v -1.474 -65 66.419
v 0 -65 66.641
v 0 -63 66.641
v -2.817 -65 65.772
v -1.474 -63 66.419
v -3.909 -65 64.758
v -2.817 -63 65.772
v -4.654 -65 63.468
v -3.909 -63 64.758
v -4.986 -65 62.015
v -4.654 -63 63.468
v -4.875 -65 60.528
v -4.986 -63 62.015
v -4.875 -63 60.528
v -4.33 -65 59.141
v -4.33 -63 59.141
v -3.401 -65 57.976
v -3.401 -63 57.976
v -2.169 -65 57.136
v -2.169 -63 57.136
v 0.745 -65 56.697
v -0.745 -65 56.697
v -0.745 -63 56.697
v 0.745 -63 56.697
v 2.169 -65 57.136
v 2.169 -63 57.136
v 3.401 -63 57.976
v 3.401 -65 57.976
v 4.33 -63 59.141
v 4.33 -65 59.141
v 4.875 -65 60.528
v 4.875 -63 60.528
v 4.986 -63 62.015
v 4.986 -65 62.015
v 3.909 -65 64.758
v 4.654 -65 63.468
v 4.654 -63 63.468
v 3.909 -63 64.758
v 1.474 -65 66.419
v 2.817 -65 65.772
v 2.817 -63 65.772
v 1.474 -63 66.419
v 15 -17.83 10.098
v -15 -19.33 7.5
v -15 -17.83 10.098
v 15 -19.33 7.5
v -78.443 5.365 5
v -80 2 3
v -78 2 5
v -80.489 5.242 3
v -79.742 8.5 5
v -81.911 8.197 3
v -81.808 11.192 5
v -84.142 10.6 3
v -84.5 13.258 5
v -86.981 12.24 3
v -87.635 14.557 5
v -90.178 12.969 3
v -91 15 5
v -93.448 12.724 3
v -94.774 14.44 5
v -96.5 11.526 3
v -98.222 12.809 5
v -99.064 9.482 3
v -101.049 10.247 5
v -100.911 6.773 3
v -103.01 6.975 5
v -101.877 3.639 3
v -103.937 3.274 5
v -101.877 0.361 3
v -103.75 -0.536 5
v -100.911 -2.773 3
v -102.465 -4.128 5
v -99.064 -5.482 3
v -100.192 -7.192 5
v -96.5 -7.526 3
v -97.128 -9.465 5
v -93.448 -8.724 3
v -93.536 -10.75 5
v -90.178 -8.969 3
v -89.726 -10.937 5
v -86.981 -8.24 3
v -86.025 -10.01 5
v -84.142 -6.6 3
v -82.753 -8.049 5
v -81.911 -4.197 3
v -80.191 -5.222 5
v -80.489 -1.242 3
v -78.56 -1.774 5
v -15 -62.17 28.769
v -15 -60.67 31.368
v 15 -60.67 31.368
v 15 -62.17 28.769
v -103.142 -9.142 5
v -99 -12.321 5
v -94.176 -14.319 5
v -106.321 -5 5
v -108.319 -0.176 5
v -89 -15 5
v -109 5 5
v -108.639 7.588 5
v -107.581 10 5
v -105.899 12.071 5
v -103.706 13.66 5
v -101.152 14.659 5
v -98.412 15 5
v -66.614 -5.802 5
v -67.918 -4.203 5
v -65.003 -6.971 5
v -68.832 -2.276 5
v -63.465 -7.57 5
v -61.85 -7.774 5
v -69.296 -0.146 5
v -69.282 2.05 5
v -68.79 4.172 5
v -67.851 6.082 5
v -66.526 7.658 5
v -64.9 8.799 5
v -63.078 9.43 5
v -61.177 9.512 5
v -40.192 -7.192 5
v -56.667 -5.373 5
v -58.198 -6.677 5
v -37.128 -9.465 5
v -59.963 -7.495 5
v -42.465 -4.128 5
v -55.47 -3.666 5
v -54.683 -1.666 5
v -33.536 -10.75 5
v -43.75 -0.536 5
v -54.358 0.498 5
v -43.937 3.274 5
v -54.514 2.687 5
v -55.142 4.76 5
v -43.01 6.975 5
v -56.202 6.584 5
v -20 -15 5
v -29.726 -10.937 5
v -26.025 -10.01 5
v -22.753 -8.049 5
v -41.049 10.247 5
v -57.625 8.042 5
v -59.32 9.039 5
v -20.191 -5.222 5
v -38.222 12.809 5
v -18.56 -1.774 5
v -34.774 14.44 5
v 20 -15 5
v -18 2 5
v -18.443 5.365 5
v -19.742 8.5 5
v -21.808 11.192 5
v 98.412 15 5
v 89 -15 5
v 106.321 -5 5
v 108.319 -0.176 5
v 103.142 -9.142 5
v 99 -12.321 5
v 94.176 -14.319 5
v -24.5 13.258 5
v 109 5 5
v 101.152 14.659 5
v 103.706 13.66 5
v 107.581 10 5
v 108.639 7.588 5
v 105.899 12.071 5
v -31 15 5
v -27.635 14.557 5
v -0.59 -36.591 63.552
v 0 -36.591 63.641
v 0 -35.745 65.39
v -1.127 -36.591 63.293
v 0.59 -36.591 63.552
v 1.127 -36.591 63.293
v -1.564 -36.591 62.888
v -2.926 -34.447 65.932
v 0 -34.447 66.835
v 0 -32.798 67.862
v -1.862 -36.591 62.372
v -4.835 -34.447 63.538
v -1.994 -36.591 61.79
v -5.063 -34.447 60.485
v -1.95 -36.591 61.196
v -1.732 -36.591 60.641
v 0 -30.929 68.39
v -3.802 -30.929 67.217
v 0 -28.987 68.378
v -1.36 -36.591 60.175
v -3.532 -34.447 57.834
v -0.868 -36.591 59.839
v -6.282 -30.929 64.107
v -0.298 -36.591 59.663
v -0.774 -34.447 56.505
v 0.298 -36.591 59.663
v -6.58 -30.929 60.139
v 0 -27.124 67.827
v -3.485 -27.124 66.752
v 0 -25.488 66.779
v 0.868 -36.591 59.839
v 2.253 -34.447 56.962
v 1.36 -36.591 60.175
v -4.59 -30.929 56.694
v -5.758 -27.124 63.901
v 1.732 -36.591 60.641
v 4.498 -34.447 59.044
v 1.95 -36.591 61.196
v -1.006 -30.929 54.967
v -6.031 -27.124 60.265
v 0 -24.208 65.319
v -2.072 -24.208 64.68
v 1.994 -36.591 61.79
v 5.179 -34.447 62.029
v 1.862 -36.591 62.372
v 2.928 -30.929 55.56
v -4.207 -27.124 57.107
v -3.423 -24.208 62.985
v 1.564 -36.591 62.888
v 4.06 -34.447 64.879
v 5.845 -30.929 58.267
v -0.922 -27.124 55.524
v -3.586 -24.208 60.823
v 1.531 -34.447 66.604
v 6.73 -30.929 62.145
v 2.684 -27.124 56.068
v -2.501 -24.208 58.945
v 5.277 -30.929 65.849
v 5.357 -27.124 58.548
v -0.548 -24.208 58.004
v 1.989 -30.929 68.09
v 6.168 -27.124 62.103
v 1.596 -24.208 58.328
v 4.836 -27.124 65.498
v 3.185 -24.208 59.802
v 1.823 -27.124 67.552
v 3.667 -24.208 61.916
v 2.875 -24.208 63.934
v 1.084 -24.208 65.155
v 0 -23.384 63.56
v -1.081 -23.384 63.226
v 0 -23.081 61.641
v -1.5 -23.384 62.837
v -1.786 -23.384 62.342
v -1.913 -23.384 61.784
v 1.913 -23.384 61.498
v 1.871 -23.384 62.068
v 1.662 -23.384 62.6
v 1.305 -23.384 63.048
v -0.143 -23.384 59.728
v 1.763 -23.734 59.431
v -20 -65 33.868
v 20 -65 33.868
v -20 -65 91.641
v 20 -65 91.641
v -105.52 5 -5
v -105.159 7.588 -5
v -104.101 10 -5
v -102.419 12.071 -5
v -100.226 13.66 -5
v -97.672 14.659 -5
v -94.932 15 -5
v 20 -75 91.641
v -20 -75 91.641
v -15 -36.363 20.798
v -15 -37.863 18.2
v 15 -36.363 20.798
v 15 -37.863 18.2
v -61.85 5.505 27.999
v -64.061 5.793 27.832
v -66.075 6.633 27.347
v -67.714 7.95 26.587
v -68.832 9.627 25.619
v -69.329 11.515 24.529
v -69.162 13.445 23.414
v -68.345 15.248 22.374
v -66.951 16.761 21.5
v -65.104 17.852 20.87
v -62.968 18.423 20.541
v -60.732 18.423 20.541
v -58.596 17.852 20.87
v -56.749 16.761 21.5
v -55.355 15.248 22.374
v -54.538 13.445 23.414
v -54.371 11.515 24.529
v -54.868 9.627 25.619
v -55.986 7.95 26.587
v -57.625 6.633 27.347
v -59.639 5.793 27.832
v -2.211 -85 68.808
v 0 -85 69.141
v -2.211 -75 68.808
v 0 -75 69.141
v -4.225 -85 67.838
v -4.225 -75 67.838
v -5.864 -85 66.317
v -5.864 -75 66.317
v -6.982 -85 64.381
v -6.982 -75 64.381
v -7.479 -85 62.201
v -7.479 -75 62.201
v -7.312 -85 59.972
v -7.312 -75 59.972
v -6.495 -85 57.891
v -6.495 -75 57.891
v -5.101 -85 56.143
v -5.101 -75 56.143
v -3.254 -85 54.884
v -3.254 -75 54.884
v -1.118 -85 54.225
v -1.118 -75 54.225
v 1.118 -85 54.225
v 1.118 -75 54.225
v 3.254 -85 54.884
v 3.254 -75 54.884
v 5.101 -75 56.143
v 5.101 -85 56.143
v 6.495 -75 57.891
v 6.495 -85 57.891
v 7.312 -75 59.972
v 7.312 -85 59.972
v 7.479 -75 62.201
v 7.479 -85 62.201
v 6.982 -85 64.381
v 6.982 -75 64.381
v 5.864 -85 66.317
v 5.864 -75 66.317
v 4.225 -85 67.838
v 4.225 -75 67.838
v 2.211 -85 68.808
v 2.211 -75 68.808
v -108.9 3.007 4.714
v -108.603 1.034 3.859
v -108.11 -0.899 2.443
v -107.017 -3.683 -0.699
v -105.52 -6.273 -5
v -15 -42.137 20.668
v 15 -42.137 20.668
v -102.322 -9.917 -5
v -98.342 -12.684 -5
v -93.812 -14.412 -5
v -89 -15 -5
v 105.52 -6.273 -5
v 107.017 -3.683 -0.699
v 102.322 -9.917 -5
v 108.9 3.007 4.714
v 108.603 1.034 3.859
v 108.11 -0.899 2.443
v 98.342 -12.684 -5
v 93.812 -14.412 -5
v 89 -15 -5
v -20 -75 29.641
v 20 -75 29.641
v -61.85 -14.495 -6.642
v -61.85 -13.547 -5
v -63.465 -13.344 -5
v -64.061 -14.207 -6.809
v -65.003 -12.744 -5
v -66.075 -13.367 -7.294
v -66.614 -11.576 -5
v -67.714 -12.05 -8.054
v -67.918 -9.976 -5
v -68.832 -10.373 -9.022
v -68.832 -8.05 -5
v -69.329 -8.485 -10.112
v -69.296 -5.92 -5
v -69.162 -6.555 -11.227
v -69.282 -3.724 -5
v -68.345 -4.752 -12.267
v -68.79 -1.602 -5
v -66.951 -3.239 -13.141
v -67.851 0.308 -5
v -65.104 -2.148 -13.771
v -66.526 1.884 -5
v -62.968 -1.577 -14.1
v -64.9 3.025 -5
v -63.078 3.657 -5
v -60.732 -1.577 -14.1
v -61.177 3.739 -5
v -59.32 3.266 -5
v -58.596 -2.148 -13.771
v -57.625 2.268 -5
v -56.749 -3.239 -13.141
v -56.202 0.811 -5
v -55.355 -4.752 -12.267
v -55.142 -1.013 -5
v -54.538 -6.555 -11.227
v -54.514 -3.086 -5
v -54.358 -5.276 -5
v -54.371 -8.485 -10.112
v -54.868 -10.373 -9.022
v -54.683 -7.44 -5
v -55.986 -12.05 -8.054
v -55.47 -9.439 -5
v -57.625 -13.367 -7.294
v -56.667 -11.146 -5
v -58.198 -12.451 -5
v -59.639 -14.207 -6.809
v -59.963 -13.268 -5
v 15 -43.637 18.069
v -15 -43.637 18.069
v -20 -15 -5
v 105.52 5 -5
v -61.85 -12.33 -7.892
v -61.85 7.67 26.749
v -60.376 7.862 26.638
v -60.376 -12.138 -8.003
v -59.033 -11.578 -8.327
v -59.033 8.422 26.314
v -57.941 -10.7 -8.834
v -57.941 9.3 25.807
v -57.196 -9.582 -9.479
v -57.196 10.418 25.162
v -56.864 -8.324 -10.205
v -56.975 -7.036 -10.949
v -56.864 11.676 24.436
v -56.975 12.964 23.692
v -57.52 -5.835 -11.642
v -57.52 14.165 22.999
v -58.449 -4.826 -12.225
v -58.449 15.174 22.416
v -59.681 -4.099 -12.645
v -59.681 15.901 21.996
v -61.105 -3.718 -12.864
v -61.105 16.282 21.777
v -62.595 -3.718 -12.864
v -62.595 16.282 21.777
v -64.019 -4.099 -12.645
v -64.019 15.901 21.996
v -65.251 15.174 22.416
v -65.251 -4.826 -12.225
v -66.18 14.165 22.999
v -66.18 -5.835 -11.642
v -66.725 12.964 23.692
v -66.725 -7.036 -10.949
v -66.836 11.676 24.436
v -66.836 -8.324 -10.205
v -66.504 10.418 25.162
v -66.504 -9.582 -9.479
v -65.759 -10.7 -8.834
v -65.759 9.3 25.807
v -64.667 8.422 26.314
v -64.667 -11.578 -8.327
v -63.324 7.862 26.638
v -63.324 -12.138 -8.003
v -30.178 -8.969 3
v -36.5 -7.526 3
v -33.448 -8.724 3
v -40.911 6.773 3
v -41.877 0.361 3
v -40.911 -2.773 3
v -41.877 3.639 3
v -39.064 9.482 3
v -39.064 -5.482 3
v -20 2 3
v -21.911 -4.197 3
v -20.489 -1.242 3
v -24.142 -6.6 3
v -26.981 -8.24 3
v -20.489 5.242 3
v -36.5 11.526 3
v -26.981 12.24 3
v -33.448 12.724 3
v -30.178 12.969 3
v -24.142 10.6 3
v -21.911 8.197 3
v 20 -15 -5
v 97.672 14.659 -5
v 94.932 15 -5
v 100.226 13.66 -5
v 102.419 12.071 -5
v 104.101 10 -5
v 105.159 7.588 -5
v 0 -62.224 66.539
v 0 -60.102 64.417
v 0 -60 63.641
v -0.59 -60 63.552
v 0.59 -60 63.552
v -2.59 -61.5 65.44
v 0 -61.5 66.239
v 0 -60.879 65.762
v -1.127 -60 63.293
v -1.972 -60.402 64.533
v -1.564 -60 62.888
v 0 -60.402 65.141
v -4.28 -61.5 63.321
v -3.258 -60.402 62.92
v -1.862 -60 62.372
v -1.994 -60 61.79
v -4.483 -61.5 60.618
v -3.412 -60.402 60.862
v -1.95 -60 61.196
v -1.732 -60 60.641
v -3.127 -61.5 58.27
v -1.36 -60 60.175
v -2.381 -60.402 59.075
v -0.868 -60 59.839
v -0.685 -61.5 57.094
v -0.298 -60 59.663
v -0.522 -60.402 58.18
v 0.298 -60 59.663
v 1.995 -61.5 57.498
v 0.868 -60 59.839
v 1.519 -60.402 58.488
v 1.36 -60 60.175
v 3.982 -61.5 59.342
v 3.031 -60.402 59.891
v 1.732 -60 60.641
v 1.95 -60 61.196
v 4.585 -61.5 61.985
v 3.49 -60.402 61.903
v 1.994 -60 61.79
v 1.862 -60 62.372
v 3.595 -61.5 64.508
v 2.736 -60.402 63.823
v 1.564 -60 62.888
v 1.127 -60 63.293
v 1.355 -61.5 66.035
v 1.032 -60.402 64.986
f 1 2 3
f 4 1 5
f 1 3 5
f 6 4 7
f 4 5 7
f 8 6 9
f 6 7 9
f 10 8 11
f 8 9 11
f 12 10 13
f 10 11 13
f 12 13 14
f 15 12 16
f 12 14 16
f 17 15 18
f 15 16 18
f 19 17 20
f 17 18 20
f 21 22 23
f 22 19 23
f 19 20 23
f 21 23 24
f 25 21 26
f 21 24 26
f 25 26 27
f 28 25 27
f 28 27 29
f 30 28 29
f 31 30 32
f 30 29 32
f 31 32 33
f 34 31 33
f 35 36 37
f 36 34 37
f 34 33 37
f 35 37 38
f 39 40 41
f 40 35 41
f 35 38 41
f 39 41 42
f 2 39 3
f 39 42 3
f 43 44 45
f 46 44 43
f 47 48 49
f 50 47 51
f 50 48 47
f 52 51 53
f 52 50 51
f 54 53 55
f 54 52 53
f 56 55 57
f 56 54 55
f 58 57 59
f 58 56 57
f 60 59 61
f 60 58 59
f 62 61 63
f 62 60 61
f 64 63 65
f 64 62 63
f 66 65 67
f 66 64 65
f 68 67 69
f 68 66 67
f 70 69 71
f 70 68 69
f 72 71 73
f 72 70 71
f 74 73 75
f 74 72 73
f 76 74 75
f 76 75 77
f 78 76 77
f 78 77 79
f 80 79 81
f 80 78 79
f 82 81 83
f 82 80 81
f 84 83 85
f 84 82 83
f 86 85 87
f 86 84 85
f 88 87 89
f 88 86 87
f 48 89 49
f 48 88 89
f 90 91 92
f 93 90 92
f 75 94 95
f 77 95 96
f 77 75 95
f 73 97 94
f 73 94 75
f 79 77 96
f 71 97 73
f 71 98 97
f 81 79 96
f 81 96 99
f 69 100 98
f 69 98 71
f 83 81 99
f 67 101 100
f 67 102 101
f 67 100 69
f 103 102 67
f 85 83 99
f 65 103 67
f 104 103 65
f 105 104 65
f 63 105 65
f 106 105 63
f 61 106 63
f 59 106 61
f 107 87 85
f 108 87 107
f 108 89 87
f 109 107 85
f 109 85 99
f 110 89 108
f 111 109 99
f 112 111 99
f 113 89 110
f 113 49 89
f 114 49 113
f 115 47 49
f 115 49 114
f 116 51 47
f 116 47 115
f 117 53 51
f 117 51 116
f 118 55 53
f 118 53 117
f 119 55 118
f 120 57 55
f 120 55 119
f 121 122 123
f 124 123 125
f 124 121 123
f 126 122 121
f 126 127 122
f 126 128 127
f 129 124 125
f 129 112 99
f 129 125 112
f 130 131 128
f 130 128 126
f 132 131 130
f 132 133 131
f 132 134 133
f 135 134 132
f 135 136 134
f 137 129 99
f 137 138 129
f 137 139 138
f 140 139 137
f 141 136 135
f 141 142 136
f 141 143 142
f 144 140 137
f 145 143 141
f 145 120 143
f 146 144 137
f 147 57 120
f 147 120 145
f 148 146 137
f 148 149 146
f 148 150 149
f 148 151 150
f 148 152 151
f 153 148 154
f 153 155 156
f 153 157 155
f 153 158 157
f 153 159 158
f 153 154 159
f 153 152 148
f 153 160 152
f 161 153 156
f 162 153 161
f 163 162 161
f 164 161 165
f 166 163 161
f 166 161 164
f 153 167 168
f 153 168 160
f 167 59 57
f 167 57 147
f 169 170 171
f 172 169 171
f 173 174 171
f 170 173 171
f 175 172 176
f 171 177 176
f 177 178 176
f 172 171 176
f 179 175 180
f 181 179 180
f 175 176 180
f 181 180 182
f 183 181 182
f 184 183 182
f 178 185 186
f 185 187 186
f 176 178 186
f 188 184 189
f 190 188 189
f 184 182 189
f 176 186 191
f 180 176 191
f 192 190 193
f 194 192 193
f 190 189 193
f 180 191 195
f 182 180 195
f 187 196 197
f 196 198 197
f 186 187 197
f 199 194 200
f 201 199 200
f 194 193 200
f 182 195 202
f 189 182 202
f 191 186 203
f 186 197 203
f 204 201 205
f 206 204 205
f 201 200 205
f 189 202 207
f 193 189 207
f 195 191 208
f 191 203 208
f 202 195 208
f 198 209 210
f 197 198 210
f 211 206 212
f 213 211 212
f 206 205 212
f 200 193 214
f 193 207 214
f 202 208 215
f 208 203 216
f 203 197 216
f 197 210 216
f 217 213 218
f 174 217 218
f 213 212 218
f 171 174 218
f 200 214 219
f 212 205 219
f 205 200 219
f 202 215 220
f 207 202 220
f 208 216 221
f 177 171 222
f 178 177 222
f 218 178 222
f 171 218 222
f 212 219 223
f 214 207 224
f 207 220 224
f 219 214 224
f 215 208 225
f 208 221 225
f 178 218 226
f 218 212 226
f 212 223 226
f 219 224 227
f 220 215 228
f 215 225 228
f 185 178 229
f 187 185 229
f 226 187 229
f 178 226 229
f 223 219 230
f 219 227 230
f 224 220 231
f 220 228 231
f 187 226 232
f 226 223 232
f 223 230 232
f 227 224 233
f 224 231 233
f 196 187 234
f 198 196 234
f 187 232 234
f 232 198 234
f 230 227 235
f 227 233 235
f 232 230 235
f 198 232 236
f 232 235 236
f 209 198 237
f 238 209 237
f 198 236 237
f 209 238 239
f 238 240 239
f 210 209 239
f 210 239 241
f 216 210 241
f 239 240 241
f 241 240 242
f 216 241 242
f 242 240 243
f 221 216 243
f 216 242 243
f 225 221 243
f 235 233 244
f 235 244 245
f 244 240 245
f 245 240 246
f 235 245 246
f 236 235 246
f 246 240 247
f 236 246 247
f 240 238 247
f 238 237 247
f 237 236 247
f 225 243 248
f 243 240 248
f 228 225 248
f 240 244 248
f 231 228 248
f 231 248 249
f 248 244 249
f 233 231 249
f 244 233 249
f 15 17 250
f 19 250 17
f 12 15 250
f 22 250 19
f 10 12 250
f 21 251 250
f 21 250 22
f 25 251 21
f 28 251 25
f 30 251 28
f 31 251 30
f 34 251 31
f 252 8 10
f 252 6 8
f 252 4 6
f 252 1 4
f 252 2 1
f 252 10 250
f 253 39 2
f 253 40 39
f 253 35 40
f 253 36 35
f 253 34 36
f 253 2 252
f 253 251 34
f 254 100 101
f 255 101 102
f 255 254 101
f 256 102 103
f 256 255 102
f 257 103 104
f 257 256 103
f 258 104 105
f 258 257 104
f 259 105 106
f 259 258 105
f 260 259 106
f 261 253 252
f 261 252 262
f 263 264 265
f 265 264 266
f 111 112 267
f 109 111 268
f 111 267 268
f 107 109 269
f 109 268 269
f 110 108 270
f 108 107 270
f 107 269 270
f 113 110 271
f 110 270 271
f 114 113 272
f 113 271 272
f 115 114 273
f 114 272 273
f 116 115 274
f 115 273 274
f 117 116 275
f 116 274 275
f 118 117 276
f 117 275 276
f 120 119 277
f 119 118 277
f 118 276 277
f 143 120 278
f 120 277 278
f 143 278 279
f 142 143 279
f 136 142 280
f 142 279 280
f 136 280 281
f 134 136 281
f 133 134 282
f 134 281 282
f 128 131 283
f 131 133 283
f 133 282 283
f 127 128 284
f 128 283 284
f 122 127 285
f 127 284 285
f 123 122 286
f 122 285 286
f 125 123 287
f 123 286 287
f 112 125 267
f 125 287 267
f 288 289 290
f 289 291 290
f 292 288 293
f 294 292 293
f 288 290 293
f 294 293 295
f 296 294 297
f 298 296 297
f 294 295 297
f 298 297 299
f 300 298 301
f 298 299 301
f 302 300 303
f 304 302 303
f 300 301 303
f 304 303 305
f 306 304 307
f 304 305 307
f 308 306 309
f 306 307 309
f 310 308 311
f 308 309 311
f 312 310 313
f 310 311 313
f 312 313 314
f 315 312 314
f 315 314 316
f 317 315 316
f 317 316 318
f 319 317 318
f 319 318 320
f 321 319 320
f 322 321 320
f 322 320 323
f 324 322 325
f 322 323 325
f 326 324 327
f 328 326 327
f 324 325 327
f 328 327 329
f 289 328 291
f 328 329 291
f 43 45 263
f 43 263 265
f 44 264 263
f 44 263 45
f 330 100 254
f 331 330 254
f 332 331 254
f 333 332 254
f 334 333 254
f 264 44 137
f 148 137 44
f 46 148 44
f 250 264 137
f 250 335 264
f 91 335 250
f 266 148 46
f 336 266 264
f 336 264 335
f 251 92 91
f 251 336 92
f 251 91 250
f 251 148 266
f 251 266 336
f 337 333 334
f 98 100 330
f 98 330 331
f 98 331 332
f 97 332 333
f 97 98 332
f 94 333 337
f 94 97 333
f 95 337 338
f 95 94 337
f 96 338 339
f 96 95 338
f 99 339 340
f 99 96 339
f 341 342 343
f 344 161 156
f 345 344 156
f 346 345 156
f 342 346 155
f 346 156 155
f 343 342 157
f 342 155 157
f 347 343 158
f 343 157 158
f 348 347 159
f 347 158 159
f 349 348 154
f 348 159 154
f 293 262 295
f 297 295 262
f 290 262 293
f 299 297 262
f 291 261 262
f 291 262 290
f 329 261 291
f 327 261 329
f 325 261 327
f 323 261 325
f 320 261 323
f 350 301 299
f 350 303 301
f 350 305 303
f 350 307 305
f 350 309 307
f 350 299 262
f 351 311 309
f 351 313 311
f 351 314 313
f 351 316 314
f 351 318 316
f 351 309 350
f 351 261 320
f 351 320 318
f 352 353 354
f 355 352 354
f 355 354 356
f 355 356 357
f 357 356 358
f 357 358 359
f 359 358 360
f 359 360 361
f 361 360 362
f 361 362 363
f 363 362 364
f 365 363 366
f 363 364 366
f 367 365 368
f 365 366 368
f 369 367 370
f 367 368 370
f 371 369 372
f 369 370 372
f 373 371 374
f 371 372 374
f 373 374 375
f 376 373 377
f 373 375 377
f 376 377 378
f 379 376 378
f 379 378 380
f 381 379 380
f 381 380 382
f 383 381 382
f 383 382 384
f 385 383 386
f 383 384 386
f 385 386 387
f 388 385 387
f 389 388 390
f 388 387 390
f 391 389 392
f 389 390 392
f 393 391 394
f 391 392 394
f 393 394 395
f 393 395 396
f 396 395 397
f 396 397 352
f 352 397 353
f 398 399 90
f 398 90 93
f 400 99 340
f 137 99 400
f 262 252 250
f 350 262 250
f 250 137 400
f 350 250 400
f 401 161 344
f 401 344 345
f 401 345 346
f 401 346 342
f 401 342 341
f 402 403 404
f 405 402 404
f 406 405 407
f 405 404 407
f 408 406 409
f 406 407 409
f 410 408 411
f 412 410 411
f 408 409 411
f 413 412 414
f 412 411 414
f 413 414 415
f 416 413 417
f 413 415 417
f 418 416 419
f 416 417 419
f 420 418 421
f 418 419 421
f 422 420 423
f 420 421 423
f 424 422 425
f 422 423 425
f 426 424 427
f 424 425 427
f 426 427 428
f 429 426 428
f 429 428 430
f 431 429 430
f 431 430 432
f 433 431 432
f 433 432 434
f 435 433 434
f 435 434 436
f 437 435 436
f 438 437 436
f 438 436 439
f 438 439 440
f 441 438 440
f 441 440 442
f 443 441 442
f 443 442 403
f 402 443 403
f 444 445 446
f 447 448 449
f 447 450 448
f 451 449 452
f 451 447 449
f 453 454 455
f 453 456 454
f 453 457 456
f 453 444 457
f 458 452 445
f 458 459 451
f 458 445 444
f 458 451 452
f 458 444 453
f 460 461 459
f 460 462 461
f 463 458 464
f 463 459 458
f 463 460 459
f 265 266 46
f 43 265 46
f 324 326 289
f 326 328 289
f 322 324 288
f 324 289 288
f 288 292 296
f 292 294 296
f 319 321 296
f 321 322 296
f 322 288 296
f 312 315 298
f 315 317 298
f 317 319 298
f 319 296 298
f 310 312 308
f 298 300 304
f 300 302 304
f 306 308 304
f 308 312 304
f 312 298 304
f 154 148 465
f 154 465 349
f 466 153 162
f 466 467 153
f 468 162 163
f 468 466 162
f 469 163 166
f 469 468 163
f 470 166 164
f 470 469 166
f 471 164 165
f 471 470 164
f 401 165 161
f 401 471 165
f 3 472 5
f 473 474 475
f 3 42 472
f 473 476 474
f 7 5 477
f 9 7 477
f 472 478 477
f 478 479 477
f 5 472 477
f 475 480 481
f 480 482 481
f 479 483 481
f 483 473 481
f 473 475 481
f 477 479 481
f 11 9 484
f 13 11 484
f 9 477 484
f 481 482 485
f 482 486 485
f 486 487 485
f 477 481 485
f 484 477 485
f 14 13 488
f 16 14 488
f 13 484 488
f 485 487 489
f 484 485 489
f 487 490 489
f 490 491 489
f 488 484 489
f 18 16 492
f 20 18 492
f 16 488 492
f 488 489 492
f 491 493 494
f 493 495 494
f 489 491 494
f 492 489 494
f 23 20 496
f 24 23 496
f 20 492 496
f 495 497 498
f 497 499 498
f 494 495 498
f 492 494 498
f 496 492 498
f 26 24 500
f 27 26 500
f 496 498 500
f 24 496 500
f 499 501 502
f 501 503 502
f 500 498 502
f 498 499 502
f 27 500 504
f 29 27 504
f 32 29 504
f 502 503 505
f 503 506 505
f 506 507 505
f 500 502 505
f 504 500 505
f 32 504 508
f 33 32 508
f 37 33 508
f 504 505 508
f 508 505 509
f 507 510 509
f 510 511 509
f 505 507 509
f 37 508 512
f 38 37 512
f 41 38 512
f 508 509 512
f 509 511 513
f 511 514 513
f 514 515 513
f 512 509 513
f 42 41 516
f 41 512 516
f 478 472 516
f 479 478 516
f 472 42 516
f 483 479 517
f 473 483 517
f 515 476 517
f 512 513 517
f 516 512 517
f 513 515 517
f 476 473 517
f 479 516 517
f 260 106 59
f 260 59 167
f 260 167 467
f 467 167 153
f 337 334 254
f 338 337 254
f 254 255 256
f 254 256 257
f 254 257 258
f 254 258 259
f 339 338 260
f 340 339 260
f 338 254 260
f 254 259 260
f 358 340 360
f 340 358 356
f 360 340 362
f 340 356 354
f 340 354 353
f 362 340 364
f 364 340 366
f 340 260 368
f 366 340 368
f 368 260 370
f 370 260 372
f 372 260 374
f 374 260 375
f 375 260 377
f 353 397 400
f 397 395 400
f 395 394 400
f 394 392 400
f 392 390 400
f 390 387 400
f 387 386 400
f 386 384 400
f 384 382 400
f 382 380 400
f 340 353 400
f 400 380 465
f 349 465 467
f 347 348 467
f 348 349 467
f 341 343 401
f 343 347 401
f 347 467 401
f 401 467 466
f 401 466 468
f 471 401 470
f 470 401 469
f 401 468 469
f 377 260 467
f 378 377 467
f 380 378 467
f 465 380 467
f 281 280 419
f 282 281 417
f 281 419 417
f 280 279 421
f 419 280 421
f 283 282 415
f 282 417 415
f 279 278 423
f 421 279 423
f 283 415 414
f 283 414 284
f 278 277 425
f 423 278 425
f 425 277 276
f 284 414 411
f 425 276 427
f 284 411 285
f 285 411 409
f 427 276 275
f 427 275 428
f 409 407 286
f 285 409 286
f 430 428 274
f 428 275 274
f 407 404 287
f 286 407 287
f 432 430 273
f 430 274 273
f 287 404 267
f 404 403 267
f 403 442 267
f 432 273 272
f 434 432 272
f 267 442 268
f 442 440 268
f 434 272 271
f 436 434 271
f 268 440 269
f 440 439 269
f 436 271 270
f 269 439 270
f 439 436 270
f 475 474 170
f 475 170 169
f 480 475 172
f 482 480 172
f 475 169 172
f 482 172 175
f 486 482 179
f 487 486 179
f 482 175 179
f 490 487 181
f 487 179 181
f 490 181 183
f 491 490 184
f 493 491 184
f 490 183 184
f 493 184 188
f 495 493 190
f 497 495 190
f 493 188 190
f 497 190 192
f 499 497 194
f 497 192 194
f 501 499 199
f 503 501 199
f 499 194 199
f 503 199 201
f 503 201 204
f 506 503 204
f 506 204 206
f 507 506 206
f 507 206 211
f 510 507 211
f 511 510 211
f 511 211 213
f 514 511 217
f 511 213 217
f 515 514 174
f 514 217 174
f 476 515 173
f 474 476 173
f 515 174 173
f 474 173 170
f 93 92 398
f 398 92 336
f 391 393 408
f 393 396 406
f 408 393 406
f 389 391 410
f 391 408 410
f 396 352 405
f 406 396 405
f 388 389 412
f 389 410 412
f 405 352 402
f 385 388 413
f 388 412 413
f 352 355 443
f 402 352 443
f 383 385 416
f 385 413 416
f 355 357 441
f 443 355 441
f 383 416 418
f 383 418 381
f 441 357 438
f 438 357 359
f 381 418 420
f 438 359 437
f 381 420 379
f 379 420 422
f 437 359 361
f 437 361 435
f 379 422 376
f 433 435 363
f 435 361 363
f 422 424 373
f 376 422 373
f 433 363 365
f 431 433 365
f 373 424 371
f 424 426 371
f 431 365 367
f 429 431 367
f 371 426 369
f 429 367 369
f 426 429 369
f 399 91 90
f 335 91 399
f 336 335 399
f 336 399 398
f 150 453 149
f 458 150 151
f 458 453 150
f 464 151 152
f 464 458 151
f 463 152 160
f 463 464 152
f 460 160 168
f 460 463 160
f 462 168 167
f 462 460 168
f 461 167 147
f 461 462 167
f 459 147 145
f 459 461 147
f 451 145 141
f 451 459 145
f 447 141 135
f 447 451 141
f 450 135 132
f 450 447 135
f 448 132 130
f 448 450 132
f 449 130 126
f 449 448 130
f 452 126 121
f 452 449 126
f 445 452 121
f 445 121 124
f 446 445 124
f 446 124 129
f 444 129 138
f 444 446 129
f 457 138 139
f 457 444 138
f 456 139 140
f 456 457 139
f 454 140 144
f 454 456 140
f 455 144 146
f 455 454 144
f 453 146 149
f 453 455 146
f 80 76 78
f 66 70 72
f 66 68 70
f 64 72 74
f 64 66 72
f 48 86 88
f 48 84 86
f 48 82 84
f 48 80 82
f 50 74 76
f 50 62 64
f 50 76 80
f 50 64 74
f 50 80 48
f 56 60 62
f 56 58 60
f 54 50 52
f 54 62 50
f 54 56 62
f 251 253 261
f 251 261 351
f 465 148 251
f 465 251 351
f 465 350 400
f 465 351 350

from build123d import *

# Parameters (mm, degrees)
SKETCH2_W           = 218
SKETCH2_H           = 30
BOSS_EXTRUDE1_DEPTH = 5
FILLET1_R           = 20
SKETCH3_R           = 10
CUT_EXTRUDE1_DEPTH  = 2
CHAMFER1_SIZE       = 3
SKETCH6_R           = 5
CUT_EXTRUDE2_DEPTH  = 119.749210232
BOSS_EXTRUDE2_DEPTH = 20
SKETCH8_W           = 30
SKETCH8_H           = 21.4
BOSS_EXTRUDE4_DEPTH = 3
SKETCH9_W           = 30
SKETCH9_H           = 21.4
CUT_EXTRUDE3_DEPTH  = 3
CUT_EXTRUDE4_DEPTH  = 40
FILLET2_R           = 10
CUT_EXTRUDE5_DEPTH  = 40
FILLET3_R           = 10


with BuildPart() as part:
    # Sketch2 → Boss-Extrude1 (new, symmetric)
    with BuildSketch(Plane.XY):
        Rectangle(SKETCH2_W, SKETCH2_H)
    extrude(amount=BOSS_EXTRUDE1_DEPTH, both=True)

    # Fillet1
    fillet1_edges = [part.edges().sort_by_distance(p)[0] for p in [
        (109, -15, 0),
        (-109, -15, 0),
    ]]
    fillet(fillet1_edges, radius=FILLET1_R)

    # Sketch3 → Cut-Extrude1 (cut, symmetric)
    with BuildSketch(Plane.XY.offset(5)):
        with Locations((-91, 2)):
            Circle(SKETCH3_R)
        with Locations((-31, 2)):
            Circle(SKETCH3_R)
    extrude(amount=CUT_EXTRUDE1_DEPTH, both=True, mode=Mode.SUBTRACT)

    # Chamfer1
    # the kernel refuses this chamfer: 3 mm, written as the material it takes off along each edge
    with BuildSketch(Plane(origin=(-31, 2, 5), x_dir=(1, 0, 0), z_dir=(0, -1, 0))) as chamfer1_piece_1_section:
        Polygon((10 + CHAMFER1_SIZE, 0), (10, -CHAMFER1_SIZE), (10, 0), align=None)
    chamfer1_piece_1 = revolve(axis=Axis((-31, 2, 5), (0, 0, 1)), mode=Mode.PRIVATE)
    chamfer1_piece_1 = split(chamfer1_piece_1, bisect_by=Plane(origin=(-42.994962735, 2, 3), z_dir=(0, 0, 1)), keep=Keep.TOP, mode=Mode.PRIVATE)
    add(chamfer1_piece_1, mode=Mode.SUBTRACT)
    with BuildSketch(Plane(origin=(-91, 2, 5), x_dir=(1, 0, 0), z_dir=(0, -1, 0))) as chamfer1_piece_2_section:
        Polygon((10 + CHAMFER1_SIZE, 0), (10, -CHAMFER1_SIZE), (10, 0), align=None)
    chamfer1_piece_2 = revolve(axis=Axis((-91, 2, 5), (0, 0, 1)), mode=Mode.PRIVATE)
    chamfer1_piece_2 = split(chamfer1_piece_2, bisect_by=Plane(origin=(-102.994962728, 2, 3), z_dir=(0, 0, 1)), keep=Keep.TOP, mode=Mode.PRIVATE)
    add(chamfer1_piece_2, mode=Mode.SUBTRACT)

    # Sketch5 → Revolve1 (revolve)
    with BuildSketch(Plane(origin=(-61.85, 0, 0), x_dir=(0, 0, -1), z_dir=(1, 0, 0)), mode=Mode.PRIVATE) as revolve1_sk:
        Polygon((-20.498711306, 18.495190528), (-24.248711306, 12), (10.392304845, -8), (14.142304845, -1.504809472), align=None)
    revolve(revolve1_sk.sketch.rotate(Axis((-61.85, 12, 24.248711306), (0, -0.4999999999999977, -0.86602540378444)), 180), axis=Axis((-61.85, 12, 24.248711306), (0, -0.4999999999999977, -0.86602540378444)))

    # Sketch6 → Cut-Extrude2 (cut, through all)
    with BuildSketch(Plane(origin=(0, 13.5, 23.382685902), x_dir=(1, 0, 0), z_dir=(0, 0.4999999999999978, 0.86602540378444))):
        with Locations(Location((-61.85, -1.732050808, 0), (0, 0, 270))):
            Circle(SKETCH6_R)
    extrude(amount=-CUT_EXTRUDE2_DEPTH, mode=Mode.SUBTRACT)

    # Sketch7 → Boss-Extrude2 (add, symmetric)
    with BuildSketch(Plane(origin=(0, 0, 0), x_dir=(0, 0, -1), z_dir=(1, 0, 0))):
        Polygon((5, -15), (-5, -15), (-33.867513459, -65), (-91.641016151, -65), (-91.641016151, -75), (-29.641016151, -75), align=None)
    extrude(amount=BOSS_EXTRUDE2_DEPTH, both=True)

    # Sketch8 → Boss-Extrude4 (add)
    with BuildSketch(Plane(origin=(0, -1.584936491, -2.745190528), x_dir=(1, 0, 0), z_dir=(0, 0.49999999999999756, 0.86602540378444))):
        with Locations((0, -31.190381057)):
            Rectangle(SKETCH8_W, SKETCH8_H)
    extrude(amount=BOSS_EXTRUDE4_DEPTH)

    # Sketch9 → Cut-Extrude3 (cut)
    with BuildSketch(Plane(origin=(0, -1.584936491, -2.745190528), x_dir=(1, 0, 0), z_dir=(0, 0.49999999999999756, 0.86602540378444))):
        with Locations((0, -57.525407976)):
            Rectangle(SKETCH9_W, SKETCH9_H)
    extrude(amount=-CUT_EXTRUDE3_DEPTH, mode=Mode.SUBTRACT)

    # Sketch10 → Revolve2 (revolve)
    with BuildSketch(Plane(origin=(0, 0, 0), x_dir=(0, 0, -1), z_dir=(1, 0, 0)), mode=Mode.PRIVATE) as revolve2_sk:
        with BuildLine():
            Line((-61.641016151, -23.080849404), (-61.641016151, -85))
            Line((-61.641016151, -85), (-54.141016151, -85))
            Line((-54.141016151, -85), (-54.141016151, -75))
            Line((-54.141016151, -75), (-56.641016151, -75))
            Line((-56.641016151, -75), (-56.641016151, -63))
            ThreePointArc((-56.641016151, -63), (-57.519695808, -60.878679656), (-59.641016151, -60))
            Line((-59.641016151, -60), (-59.641016151, -36.590975833))
            ThreePointArc((-59.641016151, -36.590975833), (-54.904038671, -28.986627083), (-61.641016151, -23.080849404))
        make_face()
    revolve(revolve2_sk.sketch.rotate(Axis((0, -23.080849404, 61.641016151), (0, -1, 0)), 180), axis=Axis((0, -23.080849404, 61.641016151), (0, -1, 0)))

    # Sketch11 → Cut-Extrude4 (cut)
    with BuildSketch(Plane(origin=(0, 15, 0), x_dir=(1, 0, 0), z_dir=(0, 1, 0))):
        Polygon((-109, 5), (-109, -5), (-105.52, 5), align=None)
    extrude(amount=-CUT_EXTRUDE4_DEPTH, mode=Mode.SUBTRACT)

    # Fillet2
    fillet2_edges = [part.edges().sort_by_distance(p)[0] for p in [
        (-107.26, 15, 0),
    ]]
    fillet(fillet2_edges, radius=FILLET2_R)

    # Sketch13 → Cut-Extrude5 (cut)
    with BuildSketch(Plane(origin=(0, 15, 0), x_dir=(1, 0, 0), z_dir=(0, 1, 0))):
        Polygon((109, 5), (109, -5), (105.52, 5), align=None)
    extrude(amount=-CUT_EXTRUDE5_DEPTH, mode=Mode.SUBTRACT)

    # Fillet3
    fillet3_edges = [part.edges().sort_by_distance(p)[0] for p in [
        (107.26, 15, 0),
    ]]
    fillet(fillet3_edges, radius=FILLET3_R)


solid = part.part
